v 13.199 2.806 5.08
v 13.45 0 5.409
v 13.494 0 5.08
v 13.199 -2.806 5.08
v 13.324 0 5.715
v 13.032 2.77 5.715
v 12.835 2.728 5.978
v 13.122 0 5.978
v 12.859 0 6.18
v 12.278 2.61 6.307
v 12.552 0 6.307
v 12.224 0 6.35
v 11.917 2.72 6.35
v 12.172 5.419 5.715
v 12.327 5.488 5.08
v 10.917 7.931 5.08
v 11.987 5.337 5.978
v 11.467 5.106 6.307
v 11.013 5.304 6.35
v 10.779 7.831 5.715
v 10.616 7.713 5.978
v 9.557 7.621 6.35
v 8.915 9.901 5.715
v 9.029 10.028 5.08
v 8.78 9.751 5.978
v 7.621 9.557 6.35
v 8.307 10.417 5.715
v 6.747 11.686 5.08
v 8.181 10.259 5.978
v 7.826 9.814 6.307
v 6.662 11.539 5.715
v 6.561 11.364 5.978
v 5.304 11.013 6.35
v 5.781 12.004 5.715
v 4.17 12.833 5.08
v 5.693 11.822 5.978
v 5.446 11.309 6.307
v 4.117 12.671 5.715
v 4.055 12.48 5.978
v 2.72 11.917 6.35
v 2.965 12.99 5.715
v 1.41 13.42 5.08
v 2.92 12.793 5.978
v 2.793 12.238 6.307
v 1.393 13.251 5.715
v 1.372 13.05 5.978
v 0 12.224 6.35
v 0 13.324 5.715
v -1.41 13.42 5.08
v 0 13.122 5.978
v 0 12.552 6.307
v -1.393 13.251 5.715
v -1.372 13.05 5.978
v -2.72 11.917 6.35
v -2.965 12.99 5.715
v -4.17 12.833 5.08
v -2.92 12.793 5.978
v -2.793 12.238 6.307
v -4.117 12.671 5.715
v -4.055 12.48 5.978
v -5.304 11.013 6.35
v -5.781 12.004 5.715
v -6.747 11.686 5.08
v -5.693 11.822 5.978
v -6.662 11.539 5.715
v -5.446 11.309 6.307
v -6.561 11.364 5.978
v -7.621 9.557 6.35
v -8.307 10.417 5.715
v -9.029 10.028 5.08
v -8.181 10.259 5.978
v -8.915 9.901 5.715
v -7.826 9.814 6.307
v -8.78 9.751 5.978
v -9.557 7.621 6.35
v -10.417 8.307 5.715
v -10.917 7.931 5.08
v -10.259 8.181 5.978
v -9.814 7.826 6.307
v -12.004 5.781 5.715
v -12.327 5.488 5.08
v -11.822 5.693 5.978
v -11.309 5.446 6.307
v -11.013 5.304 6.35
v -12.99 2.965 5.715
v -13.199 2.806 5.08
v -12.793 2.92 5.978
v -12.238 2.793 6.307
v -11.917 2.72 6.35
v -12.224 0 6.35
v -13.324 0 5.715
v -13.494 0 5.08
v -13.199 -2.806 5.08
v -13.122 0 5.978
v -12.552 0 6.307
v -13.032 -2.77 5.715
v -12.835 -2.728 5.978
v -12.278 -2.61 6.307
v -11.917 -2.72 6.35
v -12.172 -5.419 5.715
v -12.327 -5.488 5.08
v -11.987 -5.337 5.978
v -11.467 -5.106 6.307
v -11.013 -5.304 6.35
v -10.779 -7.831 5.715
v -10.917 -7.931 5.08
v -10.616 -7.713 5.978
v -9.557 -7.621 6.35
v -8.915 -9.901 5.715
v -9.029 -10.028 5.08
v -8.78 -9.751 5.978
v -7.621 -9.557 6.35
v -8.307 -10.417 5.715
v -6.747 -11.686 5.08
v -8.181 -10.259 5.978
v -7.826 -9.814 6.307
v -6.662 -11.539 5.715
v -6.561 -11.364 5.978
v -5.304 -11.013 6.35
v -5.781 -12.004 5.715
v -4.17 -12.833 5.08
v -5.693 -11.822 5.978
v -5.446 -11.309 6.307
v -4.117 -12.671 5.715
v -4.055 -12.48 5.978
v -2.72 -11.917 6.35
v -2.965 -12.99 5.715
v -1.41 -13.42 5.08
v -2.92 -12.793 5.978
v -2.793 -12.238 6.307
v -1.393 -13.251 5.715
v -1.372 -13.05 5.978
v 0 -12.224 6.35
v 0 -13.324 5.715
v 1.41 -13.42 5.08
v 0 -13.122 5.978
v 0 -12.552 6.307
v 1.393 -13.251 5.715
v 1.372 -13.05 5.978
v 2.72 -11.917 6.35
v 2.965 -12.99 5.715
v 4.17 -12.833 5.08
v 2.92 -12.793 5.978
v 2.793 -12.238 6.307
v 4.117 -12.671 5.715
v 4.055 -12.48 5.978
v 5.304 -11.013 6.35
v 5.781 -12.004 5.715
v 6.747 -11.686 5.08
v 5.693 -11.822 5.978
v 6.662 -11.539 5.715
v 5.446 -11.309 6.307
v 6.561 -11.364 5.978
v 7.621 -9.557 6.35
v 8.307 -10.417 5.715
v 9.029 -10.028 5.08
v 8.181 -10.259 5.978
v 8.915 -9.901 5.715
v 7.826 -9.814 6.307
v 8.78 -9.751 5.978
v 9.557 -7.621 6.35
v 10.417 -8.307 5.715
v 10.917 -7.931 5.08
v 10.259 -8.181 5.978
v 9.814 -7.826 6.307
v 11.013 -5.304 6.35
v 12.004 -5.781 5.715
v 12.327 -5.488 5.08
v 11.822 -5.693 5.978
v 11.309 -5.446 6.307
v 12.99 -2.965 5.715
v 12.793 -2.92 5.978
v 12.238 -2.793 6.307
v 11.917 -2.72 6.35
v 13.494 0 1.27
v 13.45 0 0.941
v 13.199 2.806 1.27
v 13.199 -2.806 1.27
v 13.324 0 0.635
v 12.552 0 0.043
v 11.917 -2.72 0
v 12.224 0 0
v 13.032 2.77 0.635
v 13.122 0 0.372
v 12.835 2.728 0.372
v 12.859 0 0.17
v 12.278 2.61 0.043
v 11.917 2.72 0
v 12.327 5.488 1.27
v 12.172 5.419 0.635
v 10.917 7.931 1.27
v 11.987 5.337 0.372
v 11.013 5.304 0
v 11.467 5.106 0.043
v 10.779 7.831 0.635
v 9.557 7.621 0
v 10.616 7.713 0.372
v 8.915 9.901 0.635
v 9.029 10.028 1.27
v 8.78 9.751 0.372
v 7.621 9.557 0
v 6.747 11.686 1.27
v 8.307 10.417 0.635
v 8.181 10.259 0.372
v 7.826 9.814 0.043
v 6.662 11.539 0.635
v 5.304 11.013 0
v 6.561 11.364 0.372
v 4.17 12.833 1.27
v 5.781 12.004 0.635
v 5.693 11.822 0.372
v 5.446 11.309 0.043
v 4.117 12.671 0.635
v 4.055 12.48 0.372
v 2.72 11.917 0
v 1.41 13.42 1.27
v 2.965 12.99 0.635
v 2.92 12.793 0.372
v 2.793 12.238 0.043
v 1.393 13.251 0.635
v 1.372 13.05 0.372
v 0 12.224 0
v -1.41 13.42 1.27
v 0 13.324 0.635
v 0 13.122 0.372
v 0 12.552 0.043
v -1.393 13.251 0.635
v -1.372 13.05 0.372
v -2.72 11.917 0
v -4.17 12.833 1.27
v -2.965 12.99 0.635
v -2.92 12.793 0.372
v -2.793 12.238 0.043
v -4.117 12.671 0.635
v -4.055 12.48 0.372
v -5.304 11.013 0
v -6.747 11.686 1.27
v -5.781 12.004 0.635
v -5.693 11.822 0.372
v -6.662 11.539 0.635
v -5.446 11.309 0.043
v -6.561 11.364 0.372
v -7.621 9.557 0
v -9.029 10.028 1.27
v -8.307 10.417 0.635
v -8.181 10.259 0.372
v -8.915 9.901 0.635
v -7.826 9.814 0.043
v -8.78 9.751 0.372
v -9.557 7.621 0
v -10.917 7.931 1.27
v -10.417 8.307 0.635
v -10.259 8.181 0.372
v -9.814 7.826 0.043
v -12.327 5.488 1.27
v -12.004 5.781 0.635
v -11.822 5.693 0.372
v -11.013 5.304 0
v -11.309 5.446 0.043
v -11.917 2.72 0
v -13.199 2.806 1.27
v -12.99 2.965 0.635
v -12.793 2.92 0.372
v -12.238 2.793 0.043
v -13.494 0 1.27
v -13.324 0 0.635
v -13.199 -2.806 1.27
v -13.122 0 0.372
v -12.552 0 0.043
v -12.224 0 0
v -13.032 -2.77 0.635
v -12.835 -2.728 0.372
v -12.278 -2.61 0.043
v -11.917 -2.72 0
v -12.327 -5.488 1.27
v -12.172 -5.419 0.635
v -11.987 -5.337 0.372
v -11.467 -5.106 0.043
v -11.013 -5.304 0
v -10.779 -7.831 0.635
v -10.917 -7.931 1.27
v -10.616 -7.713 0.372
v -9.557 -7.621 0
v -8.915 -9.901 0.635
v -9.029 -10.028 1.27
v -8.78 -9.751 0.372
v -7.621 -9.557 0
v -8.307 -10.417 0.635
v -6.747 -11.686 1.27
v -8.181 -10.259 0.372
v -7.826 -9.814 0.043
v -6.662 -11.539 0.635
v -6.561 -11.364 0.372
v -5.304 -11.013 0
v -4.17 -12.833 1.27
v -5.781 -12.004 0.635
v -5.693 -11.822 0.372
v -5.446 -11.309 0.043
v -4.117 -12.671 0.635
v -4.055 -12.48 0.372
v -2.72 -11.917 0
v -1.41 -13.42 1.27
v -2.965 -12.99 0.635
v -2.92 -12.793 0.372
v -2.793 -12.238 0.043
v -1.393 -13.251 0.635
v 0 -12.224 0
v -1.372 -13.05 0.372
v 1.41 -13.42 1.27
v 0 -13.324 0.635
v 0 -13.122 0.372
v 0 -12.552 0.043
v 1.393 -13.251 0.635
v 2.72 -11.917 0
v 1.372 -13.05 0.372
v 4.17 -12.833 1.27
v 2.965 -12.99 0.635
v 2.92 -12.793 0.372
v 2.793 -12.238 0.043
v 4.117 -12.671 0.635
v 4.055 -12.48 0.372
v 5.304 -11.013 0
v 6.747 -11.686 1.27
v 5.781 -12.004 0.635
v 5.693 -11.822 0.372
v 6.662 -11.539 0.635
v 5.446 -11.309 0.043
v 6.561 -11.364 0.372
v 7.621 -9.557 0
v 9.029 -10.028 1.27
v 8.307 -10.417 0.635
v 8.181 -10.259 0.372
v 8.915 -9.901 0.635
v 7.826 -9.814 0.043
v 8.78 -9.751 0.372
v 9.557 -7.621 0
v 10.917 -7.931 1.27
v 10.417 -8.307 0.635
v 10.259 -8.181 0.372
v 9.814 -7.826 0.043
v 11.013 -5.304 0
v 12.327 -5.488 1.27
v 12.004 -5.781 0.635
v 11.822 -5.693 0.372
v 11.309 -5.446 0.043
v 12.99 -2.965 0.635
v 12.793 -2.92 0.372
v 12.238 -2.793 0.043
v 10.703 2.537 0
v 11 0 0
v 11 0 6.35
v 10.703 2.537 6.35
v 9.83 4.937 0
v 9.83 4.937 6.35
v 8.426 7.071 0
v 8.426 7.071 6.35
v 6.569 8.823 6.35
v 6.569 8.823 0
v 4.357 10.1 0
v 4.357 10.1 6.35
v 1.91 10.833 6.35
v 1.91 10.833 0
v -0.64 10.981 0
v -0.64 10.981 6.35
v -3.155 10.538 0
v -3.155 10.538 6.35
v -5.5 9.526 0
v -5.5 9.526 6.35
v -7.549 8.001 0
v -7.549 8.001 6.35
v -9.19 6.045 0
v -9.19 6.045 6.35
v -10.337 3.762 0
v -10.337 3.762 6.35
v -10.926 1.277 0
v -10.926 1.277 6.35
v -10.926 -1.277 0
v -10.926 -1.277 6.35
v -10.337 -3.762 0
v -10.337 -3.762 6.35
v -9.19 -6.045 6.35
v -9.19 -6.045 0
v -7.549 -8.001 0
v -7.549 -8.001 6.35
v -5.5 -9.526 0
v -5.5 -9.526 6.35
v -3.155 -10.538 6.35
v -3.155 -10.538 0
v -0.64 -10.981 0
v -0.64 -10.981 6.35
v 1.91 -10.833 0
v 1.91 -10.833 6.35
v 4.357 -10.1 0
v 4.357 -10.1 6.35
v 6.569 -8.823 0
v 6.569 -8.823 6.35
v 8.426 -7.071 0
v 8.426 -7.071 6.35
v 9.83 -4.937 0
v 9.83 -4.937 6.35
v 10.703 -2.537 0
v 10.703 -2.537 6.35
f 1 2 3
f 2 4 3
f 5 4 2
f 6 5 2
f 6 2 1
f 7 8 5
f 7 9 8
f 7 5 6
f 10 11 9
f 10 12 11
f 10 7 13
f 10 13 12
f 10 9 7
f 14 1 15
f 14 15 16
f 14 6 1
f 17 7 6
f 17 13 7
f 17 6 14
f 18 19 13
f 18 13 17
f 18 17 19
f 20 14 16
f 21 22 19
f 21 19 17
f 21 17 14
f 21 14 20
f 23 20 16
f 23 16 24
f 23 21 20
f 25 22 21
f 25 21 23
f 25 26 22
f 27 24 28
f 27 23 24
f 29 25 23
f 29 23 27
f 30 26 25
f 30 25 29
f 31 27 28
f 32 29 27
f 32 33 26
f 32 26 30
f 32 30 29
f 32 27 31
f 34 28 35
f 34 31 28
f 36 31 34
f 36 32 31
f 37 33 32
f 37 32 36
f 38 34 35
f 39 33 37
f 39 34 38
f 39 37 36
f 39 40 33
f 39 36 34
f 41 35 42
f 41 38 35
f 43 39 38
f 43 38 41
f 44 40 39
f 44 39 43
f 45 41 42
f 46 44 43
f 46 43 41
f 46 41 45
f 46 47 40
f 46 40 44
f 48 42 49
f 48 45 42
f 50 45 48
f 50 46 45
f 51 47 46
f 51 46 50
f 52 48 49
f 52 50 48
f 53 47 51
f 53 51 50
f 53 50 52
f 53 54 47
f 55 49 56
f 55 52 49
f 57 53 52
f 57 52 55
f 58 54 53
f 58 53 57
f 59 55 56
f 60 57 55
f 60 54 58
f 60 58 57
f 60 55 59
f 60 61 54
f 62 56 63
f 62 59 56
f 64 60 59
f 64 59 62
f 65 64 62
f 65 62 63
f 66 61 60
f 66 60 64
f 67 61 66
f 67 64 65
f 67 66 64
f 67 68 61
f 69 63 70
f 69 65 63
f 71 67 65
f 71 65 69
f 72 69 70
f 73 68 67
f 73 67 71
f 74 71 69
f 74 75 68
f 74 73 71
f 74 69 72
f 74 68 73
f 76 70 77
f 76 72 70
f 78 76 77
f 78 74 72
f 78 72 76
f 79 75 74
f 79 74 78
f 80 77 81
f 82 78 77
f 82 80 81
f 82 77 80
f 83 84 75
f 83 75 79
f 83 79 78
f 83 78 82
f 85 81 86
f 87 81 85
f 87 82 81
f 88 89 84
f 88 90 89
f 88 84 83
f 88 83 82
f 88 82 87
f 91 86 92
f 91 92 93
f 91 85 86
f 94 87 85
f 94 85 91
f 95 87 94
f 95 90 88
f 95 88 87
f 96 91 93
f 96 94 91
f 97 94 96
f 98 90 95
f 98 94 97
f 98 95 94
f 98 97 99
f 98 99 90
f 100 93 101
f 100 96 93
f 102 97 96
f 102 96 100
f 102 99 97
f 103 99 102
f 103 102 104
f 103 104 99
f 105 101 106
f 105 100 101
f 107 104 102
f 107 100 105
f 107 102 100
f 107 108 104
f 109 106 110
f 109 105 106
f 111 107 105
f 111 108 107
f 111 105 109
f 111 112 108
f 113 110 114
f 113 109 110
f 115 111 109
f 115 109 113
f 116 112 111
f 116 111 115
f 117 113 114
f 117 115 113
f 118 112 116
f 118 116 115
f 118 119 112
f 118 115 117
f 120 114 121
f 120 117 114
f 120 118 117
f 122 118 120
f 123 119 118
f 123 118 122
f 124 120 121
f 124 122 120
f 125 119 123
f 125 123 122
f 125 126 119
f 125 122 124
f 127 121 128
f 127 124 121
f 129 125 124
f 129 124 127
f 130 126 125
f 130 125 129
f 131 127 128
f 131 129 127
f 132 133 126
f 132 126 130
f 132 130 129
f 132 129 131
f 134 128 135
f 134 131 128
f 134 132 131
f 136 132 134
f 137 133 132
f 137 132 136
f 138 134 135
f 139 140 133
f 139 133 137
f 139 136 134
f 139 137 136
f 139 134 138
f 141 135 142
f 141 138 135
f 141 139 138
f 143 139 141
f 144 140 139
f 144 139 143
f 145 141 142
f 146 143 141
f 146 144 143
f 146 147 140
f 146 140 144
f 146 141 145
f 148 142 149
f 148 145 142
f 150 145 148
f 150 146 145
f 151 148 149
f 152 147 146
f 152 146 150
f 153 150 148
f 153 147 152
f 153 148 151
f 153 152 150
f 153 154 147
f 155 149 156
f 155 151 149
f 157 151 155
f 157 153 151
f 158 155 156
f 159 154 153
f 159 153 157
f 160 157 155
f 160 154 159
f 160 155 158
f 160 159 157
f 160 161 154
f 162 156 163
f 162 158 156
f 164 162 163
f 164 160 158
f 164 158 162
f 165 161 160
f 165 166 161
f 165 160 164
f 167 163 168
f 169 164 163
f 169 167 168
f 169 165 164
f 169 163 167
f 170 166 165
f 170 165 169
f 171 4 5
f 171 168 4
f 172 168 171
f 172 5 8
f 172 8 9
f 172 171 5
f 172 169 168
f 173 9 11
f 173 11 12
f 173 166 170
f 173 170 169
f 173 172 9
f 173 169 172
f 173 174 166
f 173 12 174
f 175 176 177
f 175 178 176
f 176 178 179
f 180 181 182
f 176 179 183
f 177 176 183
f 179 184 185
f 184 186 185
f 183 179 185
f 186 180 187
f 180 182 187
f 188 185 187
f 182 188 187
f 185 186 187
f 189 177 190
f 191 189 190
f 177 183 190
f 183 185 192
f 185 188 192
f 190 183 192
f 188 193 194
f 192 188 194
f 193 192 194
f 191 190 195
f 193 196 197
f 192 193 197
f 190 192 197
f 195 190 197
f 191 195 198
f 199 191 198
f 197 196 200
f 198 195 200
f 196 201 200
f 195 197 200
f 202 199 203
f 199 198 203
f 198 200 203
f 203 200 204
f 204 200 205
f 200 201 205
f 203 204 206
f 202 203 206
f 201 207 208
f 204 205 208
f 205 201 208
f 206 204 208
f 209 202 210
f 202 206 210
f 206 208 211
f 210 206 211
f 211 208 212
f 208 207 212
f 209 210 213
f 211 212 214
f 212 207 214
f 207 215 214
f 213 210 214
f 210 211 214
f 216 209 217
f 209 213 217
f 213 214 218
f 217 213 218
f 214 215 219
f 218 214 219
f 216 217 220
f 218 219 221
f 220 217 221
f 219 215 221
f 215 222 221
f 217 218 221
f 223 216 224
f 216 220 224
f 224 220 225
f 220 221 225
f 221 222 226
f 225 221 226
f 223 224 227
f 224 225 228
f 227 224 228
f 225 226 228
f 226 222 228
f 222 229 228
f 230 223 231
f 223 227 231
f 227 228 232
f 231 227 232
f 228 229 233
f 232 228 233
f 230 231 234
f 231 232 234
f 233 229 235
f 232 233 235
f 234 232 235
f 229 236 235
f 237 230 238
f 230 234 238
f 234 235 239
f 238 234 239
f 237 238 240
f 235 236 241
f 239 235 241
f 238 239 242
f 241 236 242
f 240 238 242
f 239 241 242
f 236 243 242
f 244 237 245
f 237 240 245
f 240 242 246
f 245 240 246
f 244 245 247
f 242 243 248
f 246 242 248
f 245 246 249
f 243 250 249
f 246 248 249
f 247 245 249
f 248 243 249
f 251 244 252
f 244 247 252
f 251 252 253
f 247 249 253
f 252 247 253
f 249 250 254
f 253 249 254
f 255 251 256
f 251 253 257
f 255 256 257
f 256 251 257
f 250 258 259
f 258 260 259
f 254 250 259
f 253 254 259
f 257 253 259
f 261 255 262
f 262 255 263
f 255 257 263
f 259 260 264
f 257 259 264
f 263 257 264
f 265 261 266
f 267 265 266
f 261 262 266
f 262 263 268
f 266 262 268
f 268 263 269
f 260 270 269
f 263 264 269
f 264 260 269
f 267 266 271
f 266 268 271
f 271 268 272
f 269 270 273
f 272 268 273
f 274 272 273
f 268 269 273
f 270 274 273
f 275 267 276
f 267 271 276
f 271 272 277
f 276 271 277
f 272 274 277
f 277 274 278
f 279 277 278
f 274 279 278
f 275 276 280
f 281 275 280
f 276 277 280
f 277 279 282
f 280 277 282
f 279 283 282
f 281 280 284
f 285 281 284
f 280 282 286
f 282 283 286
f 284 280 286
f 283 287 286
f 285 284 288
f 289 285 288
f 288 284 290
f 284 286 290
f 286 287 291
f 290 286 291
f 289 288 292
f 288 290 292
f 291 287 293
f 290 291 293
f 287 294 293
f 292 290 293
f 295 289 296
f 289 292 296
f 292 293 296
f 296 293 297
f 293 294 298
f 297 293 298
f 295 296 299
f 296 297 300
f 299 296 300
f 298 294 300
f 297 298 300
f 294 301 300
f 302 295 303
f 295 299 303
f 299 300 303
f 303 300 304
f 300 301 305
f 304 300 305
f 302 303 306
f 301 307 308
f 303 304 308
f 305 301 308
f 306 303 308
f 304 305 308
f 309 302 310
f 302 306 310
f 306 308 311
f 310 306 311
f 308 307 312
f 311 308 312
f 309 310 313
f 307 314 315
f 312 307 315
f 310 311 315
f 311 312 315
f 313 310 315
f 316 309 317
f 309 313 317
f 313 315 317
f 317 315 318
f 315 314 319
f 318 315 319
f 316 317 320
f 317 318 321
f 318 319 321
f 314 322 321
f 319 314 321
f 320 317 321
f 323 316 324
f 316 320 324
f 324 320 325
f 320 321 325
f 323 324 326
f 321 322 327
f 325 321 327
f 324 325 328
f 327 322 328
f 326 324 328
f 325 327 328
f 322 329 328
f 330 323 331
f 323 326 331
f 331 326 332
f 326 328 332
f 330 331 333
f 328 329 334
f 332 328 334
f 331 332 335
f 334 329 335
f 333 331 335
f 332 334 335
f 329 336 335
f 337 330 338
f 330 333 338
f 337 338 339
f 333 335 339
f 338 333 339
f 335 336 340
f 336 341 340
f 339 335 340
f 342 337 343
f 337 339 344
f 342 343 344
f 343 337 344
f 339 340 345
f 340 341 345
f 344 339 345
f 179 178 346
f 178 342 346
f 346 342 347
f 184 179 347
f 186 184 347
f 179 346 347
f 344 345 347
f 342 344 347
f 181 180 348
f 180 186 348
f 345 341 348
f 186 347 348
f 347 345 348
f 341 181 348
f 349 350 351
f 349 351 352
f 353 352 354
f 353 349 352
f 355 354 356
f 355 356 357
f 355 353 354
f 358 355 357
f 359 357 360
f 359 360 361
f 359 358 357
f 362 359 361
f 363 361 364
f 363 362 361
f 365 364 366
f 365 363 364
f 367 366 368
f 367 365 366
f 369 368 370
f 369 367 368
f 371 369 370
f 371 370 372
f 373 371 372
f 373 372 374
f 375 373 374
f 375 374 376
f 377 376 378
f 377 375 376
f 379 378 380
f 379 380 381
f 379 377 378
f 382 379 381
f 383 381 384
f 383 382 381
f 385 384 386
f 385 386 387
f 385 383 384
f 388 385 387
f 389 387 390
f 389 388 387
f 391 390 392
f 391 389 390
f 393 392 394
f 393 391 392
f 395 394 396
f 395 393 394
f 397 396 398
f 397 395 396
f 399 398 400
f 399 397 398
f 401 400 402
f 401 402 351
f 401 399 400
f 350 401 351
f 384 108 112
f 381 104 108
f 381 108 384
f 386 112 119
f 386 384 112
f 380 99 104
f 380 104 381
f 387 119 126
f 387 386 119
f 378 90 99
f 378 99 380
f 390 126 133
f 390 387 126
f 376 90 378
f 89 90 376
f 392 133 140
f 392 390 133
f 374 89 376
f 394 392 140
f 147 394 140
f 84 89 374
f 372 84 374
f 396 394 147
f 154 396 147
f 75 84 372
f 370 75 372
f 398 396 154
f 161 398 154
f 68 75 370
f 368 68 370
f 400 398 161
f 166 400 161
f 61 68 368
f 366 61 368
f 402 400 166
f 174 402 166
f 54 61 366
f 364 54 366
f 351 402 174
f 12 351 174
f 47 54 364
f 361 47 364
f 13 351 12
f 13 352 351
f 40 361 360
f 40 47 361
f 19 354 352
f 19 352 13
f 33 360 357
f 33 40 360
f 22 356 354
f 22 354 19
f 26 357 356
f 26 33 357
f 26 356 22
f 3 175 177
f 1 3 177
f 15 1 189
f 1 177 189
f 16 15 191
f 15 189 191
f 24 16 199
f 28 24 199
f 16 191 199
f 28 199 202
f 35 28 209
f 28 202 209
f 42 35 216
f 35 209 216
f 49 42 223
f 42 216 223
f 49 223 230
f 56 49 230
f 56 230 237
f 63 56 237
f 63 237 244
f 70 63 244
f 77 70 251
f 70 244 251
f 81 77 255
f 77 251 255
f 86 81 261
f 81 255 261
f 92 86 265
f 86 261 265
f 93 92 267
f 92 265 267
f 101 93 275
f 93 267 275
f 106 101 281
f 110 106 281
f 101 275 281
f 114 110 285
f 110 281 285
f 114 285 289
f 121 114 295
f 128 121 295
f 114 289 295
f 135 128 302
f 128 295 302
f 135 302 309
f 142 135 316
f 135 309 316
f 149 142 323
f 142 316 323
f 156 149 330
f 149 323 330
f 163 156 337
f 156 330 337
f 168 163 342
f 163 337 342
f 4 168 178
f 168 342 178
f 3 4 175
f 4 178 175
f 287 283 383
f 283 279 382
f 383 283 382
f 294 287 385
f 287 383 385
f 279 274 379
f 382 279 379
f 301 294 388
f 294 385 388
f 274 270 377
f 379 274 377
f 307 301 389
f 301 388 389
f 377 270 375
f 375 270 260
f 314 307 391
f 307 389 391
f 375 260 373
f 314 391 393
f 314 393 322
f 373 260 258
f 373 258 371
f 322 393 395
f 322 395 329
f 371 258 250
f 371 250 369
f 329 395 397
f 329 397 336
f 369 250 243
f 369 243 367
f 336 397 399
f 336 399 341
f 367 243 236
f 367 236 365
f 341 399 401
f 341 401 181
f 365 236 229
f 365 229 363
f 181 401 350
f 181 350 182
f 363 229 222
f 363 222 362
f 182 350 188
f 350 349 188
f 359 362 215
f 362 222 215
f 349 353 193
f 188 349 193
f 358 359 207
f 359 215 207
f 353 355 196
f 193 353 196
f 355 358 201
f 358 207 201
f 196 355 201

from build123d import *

# Parameters (mm, degrees)
F0_R     = 13.49375
F0_R_2   = 11
F1_DEPTH = 6.35
F2_R     = 1.27
F3_R     = 1.27


with BuildPart() as f1:
    # F0 (on Top) → F1 (new body)
    with BuildSketch(Plane.XY):
        Circle(F0_R)
        Circle(F0_R_2, mode=Mode.SUBTRACT)
    extrude(amount=F1_DEPTH)

    # F2
    f2_edges = [f1.edges().sort_by_distance(p)[0] for p in [
        (-13.49375, 0, 0),
    ]]
    fillet(f2_edges, radius=F2_R)

    # F3
    f3_edges = [f1.edges().sort_by_distance(p)[0] for p in [
        (-13.49375, 0, 6.35),
    ]]
    fillet(f3_edges, radius=F3_R)


solid = f1.part
